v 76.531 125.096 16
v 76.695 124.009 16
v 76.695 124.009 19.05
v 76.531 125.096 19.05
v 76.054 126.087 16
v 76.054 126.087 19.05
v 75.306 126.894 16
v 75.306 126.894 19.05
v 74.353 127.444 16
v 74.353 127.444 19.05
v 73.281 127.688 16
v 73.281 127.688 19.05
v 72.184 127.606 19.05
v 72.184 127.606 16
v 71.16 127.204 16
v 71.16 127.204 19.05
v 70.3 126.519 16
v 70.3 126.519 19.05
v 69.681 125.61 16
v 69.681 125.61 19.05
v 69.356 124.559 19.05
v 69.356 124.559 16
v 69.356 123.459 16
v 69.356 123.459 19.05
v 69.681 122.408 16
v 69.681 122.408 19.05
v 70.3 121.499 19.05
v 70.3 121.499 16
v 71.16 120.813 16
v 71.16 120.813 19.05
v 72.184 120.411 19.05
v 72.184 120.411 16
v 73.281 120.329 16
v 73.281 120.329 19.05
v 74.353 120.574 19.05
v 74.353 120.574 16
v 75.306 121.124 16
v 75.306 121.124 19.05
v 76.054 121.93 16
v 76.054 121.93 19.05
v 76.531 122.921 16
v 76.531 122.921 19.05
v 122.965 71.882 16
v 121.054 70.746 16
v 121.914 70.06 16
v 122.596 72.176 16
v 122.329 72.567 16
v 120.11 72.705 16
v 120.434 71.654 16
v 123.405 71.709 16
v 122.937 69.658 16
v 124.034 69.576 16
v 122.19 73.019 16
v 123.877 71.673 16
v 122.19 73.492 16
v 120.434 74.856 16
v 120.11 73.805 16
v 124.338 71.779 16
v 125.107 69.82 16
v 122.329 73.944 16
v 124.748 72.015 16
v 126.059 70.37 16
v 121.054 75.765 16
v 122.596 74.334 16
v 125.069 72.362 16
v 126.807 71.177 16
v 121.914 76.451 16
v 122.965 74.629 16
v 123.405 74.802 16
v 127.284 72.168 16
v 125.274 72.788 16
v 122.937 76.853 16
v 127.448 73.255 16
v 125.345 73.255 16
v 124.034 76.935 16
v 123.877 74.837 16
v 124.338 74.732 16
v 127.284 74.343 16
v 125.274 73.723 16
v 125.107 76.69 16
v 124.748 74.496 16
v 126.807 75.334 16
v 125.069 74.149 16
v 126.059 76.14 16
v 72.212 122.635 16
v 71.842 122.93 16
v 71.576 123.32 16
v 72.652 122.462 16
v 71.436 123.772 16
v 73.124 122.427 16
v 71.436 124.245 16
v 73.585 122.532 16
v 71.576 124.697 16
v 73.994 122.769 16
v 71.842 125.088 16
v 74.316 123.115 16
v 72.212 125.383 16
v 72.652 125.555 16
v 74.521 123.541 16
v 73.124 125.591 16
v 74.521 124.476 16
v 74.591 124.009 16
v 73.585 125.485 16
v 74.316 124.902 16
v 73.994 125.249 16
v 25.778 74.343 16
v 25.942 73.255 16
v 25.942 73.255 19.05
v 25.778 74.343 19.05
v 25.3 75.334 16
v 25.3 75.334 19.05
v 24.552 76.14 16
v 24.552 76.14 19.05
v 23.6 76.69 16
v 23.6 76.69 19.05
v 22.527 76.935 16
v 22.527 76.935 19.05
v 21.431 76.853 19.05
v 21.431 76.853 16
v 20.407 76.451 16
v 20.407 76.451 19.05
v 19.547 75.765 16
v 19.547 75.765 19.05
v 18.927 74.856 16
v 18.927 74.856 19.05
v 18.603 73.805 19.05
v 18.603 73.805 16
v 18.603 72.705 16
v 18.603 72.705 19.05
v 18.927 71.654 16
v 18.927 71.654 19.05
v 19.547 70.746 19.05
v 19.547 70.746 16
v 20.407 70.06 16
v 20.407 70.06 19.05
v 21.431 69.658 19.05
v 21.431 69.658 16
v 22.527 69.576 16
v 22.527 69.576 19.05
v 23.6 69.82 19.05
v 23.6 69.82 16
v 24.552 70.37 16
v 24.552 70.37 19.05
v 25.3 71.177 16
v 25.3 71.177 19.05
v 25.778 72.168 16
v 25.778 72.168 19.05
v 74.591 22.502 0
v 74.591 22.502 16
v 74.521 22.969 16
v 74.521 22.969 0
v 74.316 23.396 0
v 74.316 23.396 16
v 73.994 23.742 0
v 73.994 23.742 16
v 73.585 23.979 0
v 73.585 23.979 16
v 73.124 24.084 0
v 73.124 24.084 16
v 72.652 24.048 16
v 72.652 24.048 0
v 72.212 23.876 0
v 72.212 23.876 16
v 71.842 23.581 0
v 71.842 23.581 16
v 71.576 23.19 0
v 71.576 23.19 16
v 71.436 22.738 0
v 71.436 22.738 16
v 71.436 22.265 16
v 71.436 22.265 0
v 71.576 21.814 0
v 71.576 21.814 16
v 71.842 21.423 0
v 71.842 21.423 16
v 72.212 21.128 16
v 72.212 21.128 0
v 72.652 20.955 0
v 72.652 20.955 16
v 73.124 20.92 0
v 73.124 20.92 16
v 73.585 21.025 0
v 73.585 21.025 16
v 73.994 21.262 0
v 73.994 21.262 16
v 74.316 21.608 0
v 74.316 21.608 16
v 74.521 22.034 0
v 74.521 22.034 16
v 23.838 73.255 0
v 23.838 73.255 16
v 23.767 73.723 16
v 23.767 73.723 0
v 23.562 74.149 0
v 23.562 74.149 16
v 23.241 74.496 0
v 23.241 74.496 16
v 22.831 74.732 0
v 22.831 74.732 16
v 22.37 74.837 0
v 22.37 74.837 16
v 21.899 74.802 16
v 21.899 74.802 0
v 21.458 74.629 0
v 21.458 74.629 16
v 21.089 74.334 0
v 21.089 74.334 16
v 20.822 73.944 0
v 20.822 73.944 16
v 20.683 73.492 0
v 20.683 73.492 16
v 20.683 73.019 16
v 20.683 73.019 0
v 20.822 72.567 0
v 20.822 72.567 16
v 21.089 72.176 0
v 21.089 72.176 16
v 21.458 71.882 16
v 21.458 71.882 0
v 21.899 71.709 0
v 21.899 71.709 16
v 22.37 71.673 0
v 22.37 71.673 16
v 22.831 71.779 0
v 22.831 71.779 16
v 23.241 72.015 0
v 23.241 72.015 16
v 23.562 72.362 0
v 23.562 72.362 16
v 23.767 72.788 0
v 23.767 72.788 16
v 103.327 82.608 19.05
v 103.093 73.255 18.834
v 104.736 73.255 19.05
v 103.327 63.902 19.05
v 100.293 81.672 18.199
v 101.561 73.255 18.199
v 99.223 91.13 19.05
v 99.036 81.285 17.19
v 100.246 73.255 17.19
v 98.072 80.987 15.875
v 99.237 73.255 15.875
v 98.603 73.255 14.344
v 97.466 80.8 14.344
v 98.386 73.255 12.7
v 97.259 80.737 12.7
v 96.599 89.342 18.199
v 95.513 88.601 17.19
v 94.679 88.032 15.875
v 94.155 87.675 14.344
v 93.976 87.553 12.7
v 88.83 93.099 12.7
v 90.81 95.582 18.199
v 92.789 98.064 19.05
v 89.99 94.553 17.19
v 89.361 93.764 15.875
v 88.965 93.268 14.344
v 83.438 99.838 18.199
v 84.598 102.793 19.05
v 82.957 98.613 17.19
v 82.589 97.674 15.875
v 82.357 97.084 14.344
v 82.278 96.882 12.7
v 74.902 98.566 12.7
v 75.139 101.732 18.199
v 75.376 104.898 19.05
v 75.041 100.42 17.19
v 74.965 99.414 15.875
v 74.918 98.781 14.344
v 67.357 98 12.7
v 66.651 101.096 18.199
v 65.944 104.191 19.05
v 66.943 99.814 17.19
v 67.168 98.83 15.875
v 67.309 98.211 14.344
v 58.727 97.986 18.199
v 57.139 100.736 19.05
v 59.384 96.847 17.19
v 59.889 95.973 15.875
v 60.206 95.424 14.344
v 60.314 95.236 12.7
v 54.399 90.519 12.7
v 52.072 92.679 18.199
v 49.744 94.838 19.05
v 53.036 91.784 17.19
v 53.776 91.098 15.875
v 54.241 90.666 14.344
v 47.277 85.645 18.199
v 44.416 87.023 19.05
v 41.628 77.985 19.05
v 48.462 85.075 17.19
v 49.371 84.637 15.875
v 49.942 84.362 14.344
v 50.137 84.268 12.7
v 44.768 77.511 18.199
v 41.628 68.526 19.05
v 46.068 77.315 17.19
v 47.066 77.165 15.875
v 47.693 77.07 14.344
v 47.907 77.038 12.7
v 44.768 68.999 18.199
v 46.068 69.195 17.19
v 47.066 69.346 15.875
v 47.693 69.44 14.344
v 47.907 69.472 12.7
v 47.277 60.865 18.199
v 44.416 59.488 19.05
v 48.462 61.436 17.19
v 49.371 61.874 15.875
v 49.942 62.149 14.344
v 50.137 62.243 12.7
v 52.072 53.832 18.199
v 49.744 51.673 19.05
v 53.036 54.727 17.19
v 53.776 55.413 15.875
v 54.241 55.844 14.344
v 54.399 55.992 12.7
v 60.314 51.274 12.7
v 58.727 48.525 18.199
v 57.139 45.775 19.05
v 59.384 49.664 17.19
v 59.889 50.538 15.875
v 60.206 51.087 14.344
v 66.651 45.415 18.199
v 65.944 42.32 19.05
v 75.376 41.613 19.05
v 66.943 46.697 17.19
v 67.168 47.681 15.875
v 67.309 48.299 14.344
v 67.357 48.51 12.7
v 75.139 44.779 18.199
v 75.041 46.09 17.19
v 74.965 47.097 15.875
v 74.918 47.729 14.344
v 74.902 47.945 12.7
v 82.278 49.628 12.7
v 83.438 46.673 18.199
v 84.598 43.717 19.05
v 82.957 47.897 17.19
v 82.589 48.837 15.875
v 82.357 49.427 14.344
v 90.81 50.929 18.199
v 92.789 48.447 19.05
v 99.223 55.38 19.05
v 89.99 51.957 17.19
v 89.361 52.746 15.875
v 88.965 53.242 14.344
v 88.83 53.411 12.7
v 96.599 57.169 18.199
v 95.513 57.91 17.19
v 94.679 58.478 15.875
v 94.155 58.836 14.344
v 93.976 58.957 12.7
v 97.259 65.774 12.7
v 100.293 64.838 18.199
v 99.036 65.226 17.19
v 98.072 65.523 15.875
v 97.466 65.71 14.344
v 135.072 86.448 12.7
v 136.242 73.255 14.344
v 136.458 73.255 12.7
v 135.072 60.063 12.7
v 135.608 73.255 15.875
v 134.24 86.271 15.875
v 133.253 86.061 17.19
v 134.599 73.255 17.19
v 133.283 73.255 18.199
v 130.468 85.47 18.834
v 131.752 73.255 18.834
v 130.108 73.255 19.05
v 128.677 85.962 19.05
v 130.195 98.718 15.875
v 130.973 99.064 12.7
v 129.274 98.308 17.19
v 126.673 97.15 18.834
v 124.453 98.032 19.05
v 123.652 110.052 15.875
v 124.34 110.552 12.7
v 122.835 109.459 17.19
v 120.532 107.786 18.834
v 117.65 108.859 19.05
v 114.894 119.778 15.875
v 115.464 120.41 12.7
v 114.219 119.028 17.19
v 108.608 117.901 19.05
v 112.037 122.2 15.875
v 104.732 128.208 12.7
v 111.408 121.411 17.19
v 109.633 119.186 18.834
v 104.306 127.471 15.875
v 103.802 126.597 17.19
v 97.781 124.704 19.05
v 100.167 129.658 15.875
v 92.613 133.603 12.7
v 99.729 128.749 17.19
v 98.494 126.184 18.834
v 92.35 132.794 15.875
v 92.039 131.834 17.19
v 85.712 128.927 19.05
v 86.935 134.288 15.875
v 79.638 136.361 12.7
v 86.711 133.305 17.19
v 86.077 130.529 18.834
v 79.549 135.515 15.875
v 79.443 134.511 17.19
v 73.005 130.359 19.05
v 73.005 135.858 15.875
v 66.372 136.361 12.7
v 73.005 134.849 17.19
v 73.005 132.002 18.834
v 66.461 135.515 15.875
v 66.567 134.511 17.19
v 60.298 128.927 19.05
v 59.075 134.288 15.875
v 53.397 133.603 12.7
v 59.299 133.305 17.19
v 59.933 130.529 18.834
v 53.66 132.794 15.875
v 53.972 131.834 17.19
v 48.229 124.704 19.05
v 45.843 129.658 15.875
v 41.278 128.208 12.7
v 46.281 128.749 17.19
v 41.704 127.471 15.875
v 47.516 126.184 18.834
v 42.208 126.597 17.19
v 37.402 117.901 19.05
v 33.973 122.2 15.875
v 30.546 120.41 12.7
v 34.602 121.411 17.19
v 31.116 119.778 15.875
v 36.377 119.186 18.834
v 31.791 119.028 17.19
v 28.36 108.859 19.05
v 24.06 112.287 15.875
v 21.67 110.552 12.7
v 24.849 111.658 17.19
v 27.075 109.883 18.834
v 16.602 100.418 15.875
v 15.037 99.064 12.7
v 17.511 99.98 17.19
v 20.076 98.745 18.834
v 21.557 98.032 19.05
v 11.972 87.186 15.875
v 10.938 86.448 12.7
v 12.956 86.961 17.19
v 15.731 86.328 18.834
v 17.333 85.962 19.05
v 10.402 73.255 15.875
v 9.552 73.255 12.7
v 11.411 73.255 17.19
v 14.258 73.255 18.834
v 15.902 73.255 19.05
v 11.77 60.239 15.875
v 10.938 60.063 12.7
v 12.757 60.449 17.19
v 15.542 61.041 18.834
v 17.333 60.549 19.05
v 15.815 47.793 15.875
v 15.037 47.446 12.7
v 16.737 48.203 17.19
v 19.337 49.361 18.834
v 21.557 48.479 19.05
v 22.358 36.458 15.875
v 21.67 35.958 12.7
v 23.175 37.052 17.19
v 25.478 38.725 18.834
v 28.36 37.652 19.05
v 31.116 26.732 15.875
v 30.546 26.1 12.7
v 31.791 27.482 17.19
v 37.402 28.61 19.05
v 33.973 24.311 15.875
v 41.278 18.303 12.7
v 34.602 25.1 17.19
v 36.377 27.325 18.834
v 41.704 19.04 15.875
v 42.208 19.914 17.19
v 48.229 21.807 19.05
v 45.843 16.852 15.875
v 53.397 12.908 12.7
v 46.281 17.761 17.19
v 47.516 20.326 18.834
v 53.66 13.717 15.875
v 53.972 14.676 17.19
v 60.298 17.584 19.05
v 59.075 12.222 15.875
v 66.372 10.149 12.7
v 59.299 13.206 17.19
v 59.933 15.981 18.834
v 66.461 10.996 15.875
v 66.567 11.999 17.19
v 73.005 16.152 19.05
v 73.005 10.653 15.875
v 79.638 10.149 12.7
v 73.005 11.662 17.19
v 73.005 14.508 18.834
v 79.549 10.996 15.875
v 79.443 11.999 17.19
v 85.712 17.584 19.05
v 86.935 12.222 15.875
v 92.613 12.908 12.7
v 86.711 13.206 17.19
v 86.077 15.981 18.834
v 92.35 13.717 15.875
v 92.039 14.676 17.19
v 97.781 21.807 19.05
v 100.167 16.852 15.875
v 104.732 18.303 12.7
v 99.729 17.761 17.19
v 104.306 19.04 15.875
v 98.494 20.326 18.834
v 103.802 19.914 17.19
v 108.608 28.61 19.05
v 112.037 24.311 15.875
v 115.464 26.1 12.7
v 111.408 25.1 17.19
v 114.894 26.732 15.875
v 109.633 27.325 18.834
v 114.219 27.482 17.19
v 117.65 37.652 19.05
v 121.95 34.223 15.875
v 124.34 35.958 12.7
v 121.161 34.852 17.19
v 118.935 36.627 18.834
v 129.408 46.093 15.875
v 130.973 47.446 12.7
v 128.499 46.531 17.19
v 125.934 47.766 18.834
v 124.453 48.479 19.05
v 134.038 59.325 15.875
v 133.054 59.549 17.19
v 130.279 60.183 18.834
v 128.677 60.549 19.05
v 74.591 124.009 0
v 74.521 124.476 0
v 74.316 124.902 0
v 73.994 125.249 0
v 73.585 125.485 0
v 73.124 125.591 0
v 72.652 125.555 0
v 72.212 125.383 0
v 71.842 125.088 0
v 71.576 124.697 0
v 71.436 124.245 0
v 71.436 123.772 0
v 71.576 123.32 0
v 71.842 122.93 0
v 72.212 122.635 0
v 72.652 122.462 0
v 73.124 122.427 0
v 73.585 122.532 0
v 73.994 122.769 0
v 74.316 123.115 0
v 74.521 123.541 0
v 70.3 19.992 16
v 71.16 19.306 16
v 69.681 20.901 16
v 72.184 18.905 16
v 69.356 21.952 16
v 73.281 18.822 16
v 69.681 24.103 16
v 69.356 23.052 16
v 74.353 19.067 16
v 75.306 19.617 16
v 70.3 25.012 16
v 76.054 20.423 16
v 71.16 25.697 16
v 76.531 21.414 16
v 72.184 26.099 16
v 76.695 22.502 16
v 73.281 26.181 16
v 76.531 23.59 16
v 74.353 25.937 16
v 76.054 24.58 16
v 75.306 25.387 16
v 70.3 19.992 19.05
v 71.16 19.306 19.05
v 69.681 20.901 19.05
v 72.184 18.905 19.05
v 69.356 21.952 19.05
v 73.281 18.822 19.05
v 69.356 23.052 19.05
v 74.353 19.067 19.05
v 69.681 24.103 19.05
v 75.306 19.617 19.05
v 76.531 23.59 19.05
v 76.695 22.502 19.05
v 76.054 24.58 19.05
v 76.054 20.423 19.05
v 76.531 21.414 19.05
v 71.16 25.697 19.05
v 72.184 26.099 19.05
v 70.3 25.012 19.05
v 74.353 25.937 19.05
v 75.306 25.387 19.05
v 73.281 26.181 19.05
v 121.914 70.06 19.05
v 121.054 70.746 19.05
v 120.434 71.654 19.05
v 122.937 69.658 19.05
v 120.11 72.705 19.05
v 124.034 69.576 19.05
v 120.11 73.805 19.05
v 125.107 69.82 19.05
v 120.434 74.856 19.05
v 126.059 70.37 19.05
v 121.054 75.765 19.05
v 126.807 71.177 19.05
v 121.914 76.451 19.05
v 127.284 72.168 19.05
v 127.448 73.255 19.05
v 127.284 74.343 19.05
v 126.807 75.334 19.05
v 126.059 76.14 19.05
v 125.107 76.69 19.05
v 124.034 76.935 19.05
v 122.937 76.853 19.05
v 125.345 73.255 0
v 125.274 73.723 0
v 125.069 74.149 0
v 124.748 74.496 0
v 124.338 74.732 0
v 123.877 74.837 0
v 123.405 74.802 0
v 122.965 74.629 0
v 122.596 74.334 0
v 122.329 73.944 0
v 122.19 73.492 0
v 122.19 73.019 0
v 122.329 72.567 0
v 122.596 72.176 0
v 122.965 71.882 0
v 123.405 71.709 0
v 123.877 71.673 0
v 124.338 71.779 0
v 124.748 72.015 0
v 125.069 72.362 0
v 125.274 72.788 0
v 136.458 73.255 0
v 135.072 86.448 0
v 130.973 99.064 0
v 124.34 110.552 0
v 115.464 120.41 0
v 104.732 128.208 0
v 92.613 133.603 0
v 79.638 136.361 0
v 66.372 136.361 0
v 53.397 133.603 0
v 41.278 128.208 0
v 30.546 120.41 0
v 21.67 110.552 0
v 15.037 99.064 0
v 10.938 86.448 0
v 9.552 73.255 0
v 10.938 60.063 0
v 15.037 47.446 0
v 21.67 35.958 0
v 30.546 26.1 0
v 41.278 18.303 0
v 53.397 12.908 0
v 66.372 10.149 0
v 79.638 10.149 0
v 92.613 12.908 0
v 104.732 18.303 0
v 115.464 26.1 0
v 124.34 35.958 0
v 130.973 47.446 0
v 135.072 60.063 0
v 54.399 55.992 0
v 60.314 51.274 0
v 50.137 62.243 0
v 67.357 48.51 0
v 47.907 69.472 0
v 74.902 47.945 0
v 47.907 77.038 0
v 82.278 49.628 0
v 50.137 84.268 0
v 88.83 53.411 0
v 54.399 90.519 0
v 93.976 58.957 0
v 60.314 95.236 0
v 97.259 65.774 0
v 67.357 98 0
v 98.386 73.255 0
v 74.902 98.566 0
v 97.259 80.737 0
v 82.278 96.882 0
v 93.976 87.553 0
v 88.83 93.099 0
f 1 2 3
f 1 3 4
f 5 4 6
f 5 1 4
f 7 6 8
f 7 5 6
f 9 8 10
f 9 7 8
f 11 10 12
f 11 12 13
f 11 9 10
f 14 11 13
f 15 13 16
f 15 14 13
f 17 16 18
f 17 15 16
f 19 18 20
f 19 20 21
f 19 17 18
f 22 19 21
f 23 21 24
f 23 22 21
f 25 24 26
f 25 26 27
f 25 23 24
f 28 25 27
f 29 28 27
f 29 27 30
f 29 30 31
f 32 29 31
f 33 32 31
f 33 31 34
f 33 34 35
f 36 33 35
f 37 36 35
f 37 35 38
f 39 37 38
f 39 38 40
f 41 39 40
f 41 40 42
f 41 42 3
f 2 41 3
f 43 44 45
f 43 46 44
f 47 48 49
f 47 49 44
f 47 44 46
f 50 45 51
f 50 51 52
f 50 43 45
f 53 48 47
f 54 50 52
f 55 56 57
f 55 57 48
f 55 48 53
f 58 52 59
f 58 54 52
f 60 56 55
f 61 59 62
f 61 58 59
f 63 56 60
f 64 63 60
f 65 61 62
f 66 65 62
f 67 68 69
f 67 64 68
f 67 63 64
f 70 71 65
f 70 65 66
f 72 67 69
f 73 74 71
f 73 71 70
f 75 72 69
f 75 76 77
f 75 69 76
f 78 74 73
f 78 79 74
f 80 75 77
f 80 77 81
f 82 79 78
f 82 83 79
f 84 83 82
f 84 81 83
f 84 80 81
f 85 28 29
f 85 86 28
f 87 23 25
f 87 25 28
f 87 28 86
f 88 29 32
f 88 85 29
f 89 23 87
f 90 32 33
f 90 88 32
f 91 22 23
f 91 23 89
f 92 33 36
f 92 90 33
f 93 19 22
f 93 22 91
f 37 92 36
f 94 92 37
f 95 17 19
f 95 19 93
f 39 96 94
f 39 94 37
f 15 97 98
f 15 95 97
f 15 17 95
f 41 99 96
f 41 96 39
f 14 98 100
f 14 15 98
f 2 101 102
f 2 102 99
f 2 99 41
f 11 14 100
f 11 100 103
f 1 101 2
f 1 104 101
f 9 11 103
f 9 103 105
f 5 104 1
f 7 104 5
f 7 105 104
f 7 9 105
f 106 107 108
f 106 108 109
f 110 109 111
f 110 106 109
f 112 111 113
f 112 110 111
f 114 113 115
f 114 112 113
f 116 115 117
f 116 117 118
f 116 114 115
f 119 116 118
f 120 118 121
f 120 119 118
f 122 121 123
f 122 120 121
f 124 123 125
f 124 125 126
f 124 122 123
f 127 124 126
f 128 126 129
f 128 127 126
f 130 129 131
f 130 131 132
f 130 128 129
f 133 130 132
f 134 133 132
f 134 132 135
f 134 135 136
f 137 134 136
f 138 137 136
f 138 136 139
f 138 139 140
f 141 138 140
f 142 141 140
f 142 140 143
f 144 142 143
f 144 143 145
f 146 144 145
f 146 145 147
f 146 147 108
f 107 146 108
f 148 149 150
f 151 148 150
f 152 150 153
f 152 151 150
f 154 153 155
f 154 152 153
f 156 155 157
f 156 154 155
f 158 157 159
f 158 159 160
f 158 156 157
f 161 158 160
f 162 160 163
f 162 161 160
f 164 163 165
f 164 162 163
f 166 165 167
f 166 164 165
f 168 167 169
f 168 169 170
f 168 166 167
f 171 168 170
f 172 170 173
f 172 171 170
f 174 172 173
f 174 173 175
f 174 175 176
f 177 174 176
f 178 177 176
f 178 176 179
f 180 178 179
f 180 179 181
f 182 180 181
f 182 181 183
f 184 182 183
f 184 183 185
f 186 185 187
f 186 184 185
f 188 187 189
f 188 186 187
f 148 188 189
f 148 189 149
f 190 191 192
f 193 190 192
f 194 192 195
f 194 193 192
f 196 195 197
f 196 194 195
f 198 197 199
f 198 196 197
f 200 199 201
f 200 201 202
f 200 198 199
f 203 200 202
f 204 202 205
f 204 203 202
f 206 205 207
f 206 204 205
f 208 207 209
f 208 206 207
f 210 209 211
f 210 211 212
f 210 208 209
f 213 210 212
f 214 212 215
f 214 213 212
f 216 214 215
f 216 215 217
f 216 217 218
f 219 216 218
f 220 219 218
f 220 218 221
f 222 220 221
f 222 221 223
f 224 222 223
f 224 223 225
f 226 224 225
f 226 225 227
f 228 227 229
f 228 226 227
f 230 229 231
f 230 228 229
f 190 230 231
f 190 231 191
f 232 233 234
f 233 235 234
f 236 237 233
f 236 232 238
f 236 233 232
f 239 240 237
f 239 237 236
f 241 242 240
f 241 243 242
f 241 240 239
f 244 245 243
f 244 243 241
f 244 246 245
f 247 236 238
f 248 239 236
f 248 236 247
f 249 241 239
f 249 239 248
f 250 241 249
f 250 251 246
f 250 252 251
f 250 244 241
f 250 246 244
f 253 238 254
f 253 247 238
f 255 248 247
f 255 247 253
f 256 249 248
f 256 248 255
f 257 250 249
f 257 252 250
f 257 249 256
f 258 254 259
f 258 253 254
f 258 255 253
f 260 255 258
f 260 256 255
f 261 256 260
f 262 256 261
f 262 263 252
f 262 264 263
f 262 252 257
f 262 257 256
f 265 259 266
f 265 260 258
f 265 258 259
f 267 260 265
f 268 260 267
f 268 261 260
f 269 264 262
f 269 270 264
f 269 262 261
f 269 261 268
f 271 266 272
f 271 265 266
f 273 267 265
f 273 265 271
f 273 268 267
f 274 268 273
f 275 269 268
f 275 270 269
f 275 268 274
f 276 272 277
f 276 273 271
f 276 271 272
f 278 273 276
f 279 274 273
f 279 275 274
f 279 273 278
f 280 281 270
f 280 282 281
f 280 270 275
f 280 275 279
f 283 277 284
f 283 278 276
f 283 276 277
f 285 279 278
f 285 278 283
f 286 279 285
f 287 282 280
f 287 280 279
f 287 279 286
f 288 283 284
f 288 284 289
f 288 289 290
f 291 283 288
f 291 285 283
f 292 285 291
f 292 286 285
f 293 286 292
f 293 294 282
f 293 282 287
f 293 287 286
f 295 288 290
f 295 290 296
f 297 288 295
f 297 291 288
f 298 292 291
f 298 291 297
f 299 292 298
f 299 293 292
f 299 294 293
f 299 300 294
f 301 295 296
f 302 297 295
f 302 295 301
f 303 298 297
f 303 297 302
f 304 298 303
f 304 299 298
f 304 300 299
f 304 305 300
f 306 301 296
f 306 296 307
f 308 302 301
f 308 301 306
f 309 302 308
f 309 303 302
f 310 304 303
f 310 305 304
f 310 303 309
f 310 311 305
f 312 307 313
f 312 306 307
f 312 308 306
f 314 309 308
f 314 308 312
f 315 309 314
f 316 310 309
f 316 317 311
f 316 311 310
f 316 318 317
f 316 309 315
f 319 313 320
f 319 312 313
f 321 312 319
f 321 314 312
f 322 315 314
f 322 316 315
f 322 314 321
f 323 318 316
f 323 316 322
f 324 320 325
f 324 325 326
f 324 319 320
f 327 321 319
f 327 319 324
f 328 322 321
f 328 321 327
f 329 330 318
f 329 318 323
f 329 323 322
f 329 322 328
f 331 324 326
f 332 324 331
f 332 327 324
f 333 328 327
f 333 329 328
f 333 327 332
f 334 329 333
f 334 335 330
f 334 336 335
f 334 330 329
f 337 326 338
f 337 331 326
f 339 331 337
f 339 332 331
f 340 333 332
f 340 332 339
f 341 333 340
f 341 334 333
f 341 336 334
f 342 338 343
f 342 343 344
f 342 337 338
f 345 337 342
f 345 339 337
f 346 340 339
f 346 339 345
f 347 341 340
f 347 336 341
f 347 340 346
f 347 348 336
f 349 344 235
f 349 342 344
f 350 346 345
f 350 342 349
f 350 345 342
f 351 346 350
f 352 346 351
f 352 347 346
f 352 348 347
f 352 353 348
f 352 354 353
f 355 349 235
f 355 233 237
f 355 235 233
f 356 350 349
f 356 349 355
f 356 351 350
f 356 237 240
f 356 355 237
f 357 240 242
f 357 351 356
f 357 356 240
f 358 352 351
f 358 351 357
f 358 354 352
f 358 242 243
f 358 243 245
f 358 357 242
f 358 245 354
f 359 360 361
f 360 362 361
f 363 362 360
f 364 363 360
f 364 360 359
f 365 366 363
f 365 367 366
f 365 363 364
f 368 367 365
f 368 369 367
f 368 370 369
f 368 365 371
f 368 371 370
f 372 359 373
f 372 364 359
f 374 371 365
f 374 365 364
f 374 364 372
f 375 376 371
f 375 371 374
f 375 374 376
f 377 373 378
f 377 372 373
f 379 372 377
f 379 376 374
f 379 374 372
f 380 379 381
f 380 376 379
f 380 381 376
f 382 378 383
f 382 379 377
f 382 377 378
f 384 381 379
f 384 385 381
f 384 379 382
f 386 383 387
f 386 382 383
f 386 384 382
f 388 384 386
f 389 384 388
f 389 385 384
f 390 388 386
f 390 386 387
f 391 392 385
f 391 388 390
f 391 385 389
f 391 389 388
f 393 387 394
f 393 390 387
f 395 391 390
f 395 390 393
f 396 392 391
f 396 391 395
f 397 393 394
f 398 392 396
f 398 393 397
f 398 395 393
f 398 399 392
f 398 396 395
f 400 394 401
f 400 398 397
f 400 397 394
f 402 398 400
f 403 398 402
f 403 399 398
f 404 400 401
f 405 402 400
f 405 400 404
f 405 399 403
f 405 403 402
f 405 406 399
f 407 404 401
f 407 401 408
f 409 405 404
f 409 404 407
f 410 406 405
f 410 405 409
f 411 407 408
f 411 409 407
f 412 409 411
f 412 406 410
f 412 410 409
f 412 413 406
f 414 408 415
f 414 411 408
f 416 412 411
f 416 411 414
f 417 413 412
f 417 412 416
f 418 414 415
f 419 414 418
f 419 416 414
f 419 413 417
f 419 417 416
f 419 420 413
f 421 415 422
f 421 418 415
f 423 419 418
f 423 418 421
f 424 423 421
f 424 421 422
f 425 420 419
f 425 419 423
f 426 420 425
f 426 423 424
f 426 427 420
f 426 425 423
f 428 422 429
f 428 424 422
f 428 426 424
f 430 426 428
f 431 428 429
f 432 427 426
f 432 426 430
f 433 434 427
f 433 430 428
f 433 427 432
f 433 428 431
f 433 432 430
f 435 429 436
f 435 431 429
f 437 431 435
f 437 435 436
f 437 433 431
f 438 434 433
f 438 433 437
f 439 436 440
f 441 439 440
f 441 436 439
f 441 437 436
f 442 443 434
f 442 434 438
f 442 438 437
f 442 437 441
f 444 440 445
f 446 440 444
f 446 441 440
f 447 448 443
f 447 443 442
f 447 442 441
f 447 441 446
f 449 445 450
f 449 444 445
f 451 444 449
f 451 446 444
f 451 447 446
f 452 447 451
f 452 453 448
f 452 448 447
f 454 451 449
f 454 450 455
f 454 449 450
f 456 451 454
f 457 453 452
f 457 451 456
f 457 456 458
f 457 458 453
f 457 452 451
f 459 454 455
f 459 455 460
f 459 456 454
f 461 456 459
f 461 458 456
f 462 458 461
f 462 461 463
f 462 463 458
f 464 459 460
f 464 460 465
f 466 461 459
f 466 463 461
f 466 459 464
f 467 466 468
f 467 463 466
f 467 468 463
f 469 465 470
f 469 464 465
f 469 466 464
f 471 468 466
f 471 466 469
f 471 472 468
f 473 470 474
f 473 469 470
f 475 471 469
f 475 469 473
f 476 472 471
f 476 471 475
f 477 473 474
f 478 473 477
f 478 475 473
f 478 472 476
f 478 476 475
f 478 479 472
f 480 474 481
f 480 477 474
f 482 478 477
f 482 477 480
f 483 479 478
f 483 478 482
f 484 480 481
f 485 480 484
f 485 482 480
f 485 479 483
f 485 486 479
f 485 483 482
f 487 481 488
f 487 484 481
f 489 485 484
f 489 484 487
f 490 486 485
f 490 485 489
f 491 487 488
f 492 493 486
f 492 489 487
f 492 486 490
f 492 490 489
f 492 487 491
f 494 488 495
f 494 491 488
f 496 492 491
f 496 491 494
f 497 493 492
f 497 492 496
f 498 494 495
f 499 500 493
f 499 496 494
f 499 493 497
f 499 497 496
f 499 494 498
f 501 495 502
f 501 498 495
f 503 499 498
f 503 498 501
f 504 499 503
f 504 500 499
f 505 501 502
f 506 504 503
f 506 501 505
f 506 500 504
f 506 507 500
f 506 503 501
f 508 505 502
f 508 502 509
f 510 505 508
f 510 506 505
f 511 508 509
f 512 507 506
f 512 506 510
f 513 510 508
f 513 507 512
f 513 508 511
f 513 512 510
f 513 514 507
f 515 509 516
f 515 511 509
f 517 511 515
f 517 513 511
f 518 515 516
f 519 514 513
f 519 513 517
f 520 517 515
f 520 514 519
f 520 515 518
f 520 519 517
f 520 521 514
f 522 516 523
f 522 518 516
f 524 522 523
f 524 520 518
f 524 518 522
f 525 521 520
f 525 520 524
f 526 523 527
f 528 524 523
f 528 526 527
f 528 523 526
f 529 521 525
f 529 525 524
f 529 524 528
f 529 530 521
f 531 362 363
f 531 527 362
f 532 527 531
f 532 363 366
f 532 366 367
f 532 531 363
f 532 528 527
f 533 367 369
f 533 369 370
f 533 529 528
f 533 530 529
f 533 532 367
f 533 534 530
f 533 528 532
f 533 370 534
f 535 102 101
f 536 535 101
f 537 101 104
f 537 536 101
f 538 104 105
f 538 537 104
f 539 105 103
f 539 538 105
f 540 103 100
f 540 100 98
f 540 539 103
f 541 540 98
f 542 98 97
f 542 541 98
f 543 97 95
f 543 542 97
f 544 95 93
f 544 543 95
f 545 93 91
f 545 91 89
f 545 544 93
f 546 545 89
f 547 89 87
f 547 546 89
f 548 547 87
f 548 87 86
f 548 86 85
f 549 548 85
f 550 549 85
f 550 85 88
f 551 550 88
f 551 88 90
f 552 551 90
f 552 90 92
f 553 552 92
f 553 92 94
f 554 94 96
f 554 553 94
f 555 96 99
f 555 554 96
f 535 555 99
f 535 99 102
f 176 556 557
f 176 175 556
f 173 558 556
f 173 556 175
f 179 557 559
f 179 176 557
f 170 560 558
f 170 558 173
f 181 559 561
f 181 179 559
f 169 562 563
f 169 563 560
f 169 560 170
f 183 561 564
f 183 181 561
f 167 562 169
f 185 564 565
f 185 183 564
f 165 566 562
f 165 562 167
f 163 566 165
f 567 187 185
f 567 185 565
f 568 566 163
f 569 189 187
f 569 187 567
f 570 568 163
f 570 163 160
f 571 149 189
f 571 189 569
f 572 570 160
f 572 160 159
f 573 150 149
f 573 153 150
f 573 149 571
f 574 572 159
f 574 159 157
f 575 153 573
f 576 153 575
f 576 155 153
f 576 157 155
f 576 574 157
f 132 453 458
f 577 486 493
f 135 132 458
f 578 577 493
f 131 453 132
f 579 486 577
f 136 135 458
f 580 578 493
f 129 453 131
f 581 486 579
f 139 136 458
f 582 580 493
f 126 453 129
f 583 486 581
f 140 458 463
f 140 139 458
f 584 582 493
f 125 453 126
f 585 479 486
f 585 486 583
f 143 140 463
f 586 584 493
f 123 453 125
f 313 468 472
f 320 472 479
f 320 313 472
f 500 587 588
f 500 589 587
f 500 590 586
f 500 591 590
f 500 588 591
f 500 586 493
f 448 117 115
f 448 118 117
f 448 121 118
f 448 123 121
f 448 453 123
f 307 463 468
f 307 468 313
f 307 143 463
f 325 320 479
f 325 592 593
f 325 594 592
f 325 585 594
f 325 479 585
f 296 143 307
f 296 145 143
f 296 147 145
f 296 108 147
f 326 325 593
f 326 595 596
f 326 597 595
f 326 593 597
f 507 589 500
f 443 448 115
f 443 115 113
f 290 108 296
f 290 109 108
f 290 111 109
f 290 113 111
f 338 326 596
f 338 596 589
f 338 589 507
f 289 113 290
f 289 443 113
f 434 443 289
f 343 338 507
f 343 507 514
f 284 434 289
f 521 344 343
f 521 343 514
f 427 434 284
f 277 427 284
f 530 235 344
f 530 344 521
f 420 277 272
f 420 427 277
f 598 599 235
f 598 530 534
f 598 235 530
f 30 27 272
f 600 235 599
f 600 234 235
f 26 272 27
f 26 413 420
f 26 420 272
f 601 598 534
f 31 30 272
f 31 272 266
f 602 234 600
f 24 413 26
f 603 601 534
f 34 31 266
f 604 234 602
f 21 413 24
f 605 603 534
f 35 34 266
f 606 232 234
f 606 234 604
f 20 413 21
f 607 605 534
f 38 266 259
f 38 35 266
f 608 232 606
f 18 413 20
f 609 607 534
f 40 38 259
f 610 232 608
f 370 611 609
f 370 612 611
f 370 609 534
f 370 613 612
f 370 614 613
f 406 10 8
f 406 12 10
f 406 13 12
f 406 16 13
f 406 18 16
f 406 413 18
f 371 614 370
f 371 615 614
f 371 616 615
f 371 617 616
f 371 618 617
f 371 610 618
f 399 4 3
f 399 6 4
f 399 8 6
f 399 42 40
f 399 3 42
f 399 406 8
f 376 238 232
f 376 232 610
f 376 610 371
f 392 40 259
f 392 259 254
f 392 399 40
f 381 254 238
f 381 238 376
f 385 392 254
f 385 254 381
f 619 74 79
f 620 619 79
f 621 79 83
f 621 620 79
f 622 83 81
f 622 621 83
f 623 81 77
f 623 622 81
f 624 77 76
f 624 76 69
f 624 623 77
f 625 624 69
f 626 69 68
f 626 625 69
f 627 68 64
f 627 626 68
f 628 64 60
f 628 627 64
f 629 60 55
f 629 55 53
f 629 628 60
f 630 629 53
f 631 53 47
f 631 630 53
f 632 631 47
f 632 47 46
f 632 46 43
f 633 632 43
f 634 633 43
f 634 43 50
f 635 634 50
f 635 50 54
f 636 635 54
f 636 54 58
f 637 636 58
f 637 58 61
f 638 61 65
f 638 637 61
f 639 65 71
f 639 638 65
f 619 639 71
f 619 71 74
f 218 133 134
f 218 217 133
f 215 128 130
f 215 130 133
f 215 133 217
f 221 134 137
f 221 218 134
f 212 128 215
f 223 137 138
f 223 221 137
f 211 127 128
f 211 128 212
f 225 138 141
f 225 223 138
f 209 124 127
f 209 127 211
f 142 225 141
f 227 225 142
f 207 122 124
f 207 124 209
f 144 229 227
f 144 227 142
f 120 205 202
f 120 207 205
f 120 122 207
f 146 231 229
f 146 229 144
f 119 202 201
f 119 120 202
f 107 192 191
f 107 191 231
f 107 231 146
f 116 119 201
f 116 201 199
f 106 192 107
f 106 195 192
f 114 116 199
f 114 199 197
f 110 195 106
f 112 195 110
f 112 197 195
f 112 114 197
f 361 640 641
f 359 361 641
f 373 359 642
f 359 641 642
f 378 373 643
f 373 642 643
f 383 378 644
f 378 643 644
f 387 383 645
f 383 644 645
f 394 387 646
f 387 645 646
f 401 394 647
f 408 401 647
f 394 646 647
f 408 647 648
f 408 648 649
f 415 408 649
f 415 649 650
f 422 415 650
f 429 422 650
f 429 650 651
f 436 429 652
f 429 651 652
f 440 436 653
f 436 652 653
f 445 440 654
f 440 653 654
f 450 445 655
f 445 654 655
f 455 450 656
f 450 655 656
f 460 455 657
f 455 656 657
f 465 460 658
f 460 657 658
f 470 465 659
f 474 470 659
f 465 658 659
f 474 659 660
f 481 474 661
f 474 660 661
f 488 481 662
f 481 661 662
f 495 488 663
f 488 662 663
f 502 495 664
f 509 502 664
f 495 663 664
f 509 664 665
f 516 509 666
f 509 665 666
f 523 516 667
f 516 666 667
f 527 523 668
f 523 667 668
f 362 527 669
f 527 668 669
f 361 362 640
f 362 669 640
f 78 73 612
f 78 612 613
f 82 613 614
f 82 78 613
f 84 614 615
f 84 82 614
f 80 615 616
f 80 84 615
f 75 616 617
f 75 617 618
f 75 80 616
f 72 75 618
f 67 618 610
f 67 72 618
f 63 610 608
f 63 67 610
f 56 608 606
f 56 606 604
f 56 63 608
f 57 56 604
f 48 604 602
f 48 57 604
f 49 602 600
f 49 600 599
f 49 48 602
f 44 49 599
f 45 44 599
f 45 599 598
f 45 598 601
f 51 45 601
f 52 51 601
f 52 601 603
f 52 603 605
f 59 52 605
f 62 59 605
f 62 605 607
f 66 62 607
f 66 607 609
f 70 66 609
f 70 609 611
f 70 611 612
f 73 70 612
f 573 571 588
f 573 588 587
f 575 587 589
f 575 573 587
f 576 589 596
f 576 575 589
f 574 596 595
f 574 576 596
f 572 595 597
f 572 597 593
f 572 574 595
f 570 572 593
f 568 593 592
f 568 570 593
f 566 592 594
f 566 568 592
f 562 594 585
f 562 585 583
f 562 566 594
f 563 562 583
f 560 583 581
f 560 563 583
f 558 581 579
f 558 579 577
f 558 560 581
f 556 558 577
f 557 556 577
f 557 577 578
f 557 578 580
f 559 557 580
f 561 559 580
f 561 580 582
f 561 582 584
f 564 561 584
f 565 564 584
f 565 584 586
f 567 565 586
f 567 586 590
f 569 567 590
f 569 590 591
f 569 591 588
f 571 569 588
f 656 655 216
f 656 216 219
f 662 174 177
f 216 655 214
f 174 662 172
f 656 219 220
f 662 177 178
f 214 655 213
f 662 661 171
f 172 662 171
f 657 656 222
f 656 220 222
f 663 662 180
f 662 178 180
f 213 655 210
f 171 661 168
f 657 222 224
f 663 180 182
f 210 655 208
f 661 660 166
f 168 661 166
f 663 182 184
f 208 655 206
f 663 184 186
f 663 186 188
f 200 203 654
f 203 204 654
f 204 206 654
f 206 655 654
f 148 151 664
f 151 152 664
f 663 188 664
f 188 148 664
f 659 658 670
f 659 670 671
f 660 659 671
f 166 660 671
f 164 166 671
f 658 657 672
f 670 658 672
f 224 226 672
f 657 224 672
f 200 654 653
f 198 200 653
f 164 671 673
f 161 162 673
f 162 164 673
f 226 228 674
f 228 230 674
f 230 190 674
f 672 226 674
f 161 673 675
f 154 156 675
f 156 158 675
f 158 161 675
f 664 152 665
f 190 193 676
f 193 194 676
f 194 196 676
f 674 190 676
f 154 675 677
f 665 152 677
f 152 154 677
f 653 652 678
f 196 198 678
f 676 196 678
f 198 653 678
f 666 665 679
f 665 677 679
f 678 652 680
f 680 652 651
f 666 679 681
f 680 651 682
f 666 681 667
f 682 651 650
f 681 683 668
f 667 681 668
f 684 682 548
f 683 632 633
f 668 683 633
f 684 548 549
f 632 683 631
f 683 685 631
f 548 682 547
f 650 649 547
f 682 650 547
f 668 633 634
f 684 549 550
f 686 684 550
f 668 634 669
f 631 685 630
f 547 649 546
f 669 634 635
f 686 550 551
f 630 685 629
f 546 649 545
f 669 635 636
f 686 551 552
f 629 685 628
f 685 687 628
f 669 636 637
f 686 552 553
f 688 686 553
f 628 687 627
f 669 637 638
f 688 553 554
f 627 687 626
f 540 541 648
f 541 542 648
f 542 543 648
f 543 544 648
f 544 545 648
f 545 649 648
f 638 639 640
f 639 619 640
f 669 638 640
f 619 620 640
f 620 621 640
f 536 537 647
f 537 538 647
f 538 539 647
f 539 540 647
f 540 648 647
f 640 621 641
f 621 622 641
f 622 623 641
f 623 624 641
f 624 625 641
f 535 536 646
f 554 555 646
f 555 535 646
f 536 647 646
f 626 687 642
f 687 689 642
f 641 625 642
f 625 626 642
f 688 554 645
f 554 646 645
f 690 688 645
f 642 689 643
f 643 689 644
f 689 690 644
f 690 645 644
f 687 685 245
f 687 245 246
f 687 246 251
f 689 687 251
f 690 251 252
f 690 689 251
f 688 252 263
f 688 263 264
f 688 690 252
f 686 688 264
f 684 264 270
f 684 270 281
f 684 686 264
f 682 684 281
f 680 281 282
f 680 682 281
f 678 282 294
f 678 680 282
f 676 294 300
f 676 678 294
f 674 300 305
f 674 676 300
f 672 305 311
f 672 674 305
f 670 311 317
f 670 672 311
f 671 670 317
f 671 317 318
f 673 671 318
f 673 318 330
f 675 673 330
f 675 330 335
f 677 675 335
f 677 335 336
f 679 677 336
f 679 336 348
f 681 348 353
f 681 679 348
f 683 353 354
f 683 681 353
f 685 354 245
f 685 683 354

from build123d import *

# Parameters (mm, degrees)
F0_R     = 63.453437
F0_R_2   = 3.689895
F0_R_3   = 25.381375
F1_DEPTH = 19.05
F0_R_4   = 1.586336
F2_DEPTH = 16
F3_R     = 6.35
F4_R     = 6.35


with BuildPart() as f1:
    # F0 (on Top) → F1 (new body)
    with BuildSketch(Plane.XY):
        with Locations((73.005051, 73.255326)):
            Circle(F0_R)
        with Locations((73.00505, 22.501889)):
            Circle(F0_R_2, mode=Mode.SUBTRACT)
        with Locations((22.251614, 73.255323)):
            Circle(F0_R_2, mode=Mode.SUBTRACT)
        with Locations((123.758487, 73.255323)):
            Circle(F0_R_2, mode=Mode.SUBTRACT)
        with Locations((73.00505, 124.008762)):
            Circle(F0_R_2, mode=Mode.SUBTRACT)
        with Locations((73.005051, 73.255326)):
            Circle(F0_R_3, mode=Mode.SUBTRACT)
    extrude(amount=F1_DEPTH)

    # F0 (on Top) → F2 (join)
    with BuildSketch(Plane.XY):
        with Locations((22.251614, 73.255323)):
            Circle(F0_R_2)
        with Locations((22.251614, 73.255323)):
            Circle(F0_R_4, mode=Mode.SUBTRACT)
        with Locations((73.00505, 22.501889)):
            Circle(F0_R_2)
        with Locations((73.00505, 22.501889)):
            Circle(F0_R_4, mode=Mode.SUBTRACT)
        with Locations((123.758487, 73.255323)):
            Circle(F0_R_2)
        with Locations((123.758487, 73.255323)):
            Circle(F0_R_4, mode=Mode.SUBTRACT)
        with Locations((73.00505, 124.008762)):
            Circle(F0_R_2)
        with Locations((73.00505, 124.008762)):
            Circle(F0_R_4, mode=Mode.SUBTRACT)
    extrude(amount=F2_DEPTH)

    # F3
    f3_edges = [f1.edges().sort_by_distance(p)[0] for p in [
        (9.551614, 73.255326, 19.05),
    ]]
    fillet(f3_edges, radius=F3_R)

    # F4
    f4_edges = [f1.edges().sort_by_distance(p)[0] for p in [
        (47.623676, 73.255326, 19.05),
    ]]
    fillet(f4_edges, radius=F4_R)


solid = f1.part
